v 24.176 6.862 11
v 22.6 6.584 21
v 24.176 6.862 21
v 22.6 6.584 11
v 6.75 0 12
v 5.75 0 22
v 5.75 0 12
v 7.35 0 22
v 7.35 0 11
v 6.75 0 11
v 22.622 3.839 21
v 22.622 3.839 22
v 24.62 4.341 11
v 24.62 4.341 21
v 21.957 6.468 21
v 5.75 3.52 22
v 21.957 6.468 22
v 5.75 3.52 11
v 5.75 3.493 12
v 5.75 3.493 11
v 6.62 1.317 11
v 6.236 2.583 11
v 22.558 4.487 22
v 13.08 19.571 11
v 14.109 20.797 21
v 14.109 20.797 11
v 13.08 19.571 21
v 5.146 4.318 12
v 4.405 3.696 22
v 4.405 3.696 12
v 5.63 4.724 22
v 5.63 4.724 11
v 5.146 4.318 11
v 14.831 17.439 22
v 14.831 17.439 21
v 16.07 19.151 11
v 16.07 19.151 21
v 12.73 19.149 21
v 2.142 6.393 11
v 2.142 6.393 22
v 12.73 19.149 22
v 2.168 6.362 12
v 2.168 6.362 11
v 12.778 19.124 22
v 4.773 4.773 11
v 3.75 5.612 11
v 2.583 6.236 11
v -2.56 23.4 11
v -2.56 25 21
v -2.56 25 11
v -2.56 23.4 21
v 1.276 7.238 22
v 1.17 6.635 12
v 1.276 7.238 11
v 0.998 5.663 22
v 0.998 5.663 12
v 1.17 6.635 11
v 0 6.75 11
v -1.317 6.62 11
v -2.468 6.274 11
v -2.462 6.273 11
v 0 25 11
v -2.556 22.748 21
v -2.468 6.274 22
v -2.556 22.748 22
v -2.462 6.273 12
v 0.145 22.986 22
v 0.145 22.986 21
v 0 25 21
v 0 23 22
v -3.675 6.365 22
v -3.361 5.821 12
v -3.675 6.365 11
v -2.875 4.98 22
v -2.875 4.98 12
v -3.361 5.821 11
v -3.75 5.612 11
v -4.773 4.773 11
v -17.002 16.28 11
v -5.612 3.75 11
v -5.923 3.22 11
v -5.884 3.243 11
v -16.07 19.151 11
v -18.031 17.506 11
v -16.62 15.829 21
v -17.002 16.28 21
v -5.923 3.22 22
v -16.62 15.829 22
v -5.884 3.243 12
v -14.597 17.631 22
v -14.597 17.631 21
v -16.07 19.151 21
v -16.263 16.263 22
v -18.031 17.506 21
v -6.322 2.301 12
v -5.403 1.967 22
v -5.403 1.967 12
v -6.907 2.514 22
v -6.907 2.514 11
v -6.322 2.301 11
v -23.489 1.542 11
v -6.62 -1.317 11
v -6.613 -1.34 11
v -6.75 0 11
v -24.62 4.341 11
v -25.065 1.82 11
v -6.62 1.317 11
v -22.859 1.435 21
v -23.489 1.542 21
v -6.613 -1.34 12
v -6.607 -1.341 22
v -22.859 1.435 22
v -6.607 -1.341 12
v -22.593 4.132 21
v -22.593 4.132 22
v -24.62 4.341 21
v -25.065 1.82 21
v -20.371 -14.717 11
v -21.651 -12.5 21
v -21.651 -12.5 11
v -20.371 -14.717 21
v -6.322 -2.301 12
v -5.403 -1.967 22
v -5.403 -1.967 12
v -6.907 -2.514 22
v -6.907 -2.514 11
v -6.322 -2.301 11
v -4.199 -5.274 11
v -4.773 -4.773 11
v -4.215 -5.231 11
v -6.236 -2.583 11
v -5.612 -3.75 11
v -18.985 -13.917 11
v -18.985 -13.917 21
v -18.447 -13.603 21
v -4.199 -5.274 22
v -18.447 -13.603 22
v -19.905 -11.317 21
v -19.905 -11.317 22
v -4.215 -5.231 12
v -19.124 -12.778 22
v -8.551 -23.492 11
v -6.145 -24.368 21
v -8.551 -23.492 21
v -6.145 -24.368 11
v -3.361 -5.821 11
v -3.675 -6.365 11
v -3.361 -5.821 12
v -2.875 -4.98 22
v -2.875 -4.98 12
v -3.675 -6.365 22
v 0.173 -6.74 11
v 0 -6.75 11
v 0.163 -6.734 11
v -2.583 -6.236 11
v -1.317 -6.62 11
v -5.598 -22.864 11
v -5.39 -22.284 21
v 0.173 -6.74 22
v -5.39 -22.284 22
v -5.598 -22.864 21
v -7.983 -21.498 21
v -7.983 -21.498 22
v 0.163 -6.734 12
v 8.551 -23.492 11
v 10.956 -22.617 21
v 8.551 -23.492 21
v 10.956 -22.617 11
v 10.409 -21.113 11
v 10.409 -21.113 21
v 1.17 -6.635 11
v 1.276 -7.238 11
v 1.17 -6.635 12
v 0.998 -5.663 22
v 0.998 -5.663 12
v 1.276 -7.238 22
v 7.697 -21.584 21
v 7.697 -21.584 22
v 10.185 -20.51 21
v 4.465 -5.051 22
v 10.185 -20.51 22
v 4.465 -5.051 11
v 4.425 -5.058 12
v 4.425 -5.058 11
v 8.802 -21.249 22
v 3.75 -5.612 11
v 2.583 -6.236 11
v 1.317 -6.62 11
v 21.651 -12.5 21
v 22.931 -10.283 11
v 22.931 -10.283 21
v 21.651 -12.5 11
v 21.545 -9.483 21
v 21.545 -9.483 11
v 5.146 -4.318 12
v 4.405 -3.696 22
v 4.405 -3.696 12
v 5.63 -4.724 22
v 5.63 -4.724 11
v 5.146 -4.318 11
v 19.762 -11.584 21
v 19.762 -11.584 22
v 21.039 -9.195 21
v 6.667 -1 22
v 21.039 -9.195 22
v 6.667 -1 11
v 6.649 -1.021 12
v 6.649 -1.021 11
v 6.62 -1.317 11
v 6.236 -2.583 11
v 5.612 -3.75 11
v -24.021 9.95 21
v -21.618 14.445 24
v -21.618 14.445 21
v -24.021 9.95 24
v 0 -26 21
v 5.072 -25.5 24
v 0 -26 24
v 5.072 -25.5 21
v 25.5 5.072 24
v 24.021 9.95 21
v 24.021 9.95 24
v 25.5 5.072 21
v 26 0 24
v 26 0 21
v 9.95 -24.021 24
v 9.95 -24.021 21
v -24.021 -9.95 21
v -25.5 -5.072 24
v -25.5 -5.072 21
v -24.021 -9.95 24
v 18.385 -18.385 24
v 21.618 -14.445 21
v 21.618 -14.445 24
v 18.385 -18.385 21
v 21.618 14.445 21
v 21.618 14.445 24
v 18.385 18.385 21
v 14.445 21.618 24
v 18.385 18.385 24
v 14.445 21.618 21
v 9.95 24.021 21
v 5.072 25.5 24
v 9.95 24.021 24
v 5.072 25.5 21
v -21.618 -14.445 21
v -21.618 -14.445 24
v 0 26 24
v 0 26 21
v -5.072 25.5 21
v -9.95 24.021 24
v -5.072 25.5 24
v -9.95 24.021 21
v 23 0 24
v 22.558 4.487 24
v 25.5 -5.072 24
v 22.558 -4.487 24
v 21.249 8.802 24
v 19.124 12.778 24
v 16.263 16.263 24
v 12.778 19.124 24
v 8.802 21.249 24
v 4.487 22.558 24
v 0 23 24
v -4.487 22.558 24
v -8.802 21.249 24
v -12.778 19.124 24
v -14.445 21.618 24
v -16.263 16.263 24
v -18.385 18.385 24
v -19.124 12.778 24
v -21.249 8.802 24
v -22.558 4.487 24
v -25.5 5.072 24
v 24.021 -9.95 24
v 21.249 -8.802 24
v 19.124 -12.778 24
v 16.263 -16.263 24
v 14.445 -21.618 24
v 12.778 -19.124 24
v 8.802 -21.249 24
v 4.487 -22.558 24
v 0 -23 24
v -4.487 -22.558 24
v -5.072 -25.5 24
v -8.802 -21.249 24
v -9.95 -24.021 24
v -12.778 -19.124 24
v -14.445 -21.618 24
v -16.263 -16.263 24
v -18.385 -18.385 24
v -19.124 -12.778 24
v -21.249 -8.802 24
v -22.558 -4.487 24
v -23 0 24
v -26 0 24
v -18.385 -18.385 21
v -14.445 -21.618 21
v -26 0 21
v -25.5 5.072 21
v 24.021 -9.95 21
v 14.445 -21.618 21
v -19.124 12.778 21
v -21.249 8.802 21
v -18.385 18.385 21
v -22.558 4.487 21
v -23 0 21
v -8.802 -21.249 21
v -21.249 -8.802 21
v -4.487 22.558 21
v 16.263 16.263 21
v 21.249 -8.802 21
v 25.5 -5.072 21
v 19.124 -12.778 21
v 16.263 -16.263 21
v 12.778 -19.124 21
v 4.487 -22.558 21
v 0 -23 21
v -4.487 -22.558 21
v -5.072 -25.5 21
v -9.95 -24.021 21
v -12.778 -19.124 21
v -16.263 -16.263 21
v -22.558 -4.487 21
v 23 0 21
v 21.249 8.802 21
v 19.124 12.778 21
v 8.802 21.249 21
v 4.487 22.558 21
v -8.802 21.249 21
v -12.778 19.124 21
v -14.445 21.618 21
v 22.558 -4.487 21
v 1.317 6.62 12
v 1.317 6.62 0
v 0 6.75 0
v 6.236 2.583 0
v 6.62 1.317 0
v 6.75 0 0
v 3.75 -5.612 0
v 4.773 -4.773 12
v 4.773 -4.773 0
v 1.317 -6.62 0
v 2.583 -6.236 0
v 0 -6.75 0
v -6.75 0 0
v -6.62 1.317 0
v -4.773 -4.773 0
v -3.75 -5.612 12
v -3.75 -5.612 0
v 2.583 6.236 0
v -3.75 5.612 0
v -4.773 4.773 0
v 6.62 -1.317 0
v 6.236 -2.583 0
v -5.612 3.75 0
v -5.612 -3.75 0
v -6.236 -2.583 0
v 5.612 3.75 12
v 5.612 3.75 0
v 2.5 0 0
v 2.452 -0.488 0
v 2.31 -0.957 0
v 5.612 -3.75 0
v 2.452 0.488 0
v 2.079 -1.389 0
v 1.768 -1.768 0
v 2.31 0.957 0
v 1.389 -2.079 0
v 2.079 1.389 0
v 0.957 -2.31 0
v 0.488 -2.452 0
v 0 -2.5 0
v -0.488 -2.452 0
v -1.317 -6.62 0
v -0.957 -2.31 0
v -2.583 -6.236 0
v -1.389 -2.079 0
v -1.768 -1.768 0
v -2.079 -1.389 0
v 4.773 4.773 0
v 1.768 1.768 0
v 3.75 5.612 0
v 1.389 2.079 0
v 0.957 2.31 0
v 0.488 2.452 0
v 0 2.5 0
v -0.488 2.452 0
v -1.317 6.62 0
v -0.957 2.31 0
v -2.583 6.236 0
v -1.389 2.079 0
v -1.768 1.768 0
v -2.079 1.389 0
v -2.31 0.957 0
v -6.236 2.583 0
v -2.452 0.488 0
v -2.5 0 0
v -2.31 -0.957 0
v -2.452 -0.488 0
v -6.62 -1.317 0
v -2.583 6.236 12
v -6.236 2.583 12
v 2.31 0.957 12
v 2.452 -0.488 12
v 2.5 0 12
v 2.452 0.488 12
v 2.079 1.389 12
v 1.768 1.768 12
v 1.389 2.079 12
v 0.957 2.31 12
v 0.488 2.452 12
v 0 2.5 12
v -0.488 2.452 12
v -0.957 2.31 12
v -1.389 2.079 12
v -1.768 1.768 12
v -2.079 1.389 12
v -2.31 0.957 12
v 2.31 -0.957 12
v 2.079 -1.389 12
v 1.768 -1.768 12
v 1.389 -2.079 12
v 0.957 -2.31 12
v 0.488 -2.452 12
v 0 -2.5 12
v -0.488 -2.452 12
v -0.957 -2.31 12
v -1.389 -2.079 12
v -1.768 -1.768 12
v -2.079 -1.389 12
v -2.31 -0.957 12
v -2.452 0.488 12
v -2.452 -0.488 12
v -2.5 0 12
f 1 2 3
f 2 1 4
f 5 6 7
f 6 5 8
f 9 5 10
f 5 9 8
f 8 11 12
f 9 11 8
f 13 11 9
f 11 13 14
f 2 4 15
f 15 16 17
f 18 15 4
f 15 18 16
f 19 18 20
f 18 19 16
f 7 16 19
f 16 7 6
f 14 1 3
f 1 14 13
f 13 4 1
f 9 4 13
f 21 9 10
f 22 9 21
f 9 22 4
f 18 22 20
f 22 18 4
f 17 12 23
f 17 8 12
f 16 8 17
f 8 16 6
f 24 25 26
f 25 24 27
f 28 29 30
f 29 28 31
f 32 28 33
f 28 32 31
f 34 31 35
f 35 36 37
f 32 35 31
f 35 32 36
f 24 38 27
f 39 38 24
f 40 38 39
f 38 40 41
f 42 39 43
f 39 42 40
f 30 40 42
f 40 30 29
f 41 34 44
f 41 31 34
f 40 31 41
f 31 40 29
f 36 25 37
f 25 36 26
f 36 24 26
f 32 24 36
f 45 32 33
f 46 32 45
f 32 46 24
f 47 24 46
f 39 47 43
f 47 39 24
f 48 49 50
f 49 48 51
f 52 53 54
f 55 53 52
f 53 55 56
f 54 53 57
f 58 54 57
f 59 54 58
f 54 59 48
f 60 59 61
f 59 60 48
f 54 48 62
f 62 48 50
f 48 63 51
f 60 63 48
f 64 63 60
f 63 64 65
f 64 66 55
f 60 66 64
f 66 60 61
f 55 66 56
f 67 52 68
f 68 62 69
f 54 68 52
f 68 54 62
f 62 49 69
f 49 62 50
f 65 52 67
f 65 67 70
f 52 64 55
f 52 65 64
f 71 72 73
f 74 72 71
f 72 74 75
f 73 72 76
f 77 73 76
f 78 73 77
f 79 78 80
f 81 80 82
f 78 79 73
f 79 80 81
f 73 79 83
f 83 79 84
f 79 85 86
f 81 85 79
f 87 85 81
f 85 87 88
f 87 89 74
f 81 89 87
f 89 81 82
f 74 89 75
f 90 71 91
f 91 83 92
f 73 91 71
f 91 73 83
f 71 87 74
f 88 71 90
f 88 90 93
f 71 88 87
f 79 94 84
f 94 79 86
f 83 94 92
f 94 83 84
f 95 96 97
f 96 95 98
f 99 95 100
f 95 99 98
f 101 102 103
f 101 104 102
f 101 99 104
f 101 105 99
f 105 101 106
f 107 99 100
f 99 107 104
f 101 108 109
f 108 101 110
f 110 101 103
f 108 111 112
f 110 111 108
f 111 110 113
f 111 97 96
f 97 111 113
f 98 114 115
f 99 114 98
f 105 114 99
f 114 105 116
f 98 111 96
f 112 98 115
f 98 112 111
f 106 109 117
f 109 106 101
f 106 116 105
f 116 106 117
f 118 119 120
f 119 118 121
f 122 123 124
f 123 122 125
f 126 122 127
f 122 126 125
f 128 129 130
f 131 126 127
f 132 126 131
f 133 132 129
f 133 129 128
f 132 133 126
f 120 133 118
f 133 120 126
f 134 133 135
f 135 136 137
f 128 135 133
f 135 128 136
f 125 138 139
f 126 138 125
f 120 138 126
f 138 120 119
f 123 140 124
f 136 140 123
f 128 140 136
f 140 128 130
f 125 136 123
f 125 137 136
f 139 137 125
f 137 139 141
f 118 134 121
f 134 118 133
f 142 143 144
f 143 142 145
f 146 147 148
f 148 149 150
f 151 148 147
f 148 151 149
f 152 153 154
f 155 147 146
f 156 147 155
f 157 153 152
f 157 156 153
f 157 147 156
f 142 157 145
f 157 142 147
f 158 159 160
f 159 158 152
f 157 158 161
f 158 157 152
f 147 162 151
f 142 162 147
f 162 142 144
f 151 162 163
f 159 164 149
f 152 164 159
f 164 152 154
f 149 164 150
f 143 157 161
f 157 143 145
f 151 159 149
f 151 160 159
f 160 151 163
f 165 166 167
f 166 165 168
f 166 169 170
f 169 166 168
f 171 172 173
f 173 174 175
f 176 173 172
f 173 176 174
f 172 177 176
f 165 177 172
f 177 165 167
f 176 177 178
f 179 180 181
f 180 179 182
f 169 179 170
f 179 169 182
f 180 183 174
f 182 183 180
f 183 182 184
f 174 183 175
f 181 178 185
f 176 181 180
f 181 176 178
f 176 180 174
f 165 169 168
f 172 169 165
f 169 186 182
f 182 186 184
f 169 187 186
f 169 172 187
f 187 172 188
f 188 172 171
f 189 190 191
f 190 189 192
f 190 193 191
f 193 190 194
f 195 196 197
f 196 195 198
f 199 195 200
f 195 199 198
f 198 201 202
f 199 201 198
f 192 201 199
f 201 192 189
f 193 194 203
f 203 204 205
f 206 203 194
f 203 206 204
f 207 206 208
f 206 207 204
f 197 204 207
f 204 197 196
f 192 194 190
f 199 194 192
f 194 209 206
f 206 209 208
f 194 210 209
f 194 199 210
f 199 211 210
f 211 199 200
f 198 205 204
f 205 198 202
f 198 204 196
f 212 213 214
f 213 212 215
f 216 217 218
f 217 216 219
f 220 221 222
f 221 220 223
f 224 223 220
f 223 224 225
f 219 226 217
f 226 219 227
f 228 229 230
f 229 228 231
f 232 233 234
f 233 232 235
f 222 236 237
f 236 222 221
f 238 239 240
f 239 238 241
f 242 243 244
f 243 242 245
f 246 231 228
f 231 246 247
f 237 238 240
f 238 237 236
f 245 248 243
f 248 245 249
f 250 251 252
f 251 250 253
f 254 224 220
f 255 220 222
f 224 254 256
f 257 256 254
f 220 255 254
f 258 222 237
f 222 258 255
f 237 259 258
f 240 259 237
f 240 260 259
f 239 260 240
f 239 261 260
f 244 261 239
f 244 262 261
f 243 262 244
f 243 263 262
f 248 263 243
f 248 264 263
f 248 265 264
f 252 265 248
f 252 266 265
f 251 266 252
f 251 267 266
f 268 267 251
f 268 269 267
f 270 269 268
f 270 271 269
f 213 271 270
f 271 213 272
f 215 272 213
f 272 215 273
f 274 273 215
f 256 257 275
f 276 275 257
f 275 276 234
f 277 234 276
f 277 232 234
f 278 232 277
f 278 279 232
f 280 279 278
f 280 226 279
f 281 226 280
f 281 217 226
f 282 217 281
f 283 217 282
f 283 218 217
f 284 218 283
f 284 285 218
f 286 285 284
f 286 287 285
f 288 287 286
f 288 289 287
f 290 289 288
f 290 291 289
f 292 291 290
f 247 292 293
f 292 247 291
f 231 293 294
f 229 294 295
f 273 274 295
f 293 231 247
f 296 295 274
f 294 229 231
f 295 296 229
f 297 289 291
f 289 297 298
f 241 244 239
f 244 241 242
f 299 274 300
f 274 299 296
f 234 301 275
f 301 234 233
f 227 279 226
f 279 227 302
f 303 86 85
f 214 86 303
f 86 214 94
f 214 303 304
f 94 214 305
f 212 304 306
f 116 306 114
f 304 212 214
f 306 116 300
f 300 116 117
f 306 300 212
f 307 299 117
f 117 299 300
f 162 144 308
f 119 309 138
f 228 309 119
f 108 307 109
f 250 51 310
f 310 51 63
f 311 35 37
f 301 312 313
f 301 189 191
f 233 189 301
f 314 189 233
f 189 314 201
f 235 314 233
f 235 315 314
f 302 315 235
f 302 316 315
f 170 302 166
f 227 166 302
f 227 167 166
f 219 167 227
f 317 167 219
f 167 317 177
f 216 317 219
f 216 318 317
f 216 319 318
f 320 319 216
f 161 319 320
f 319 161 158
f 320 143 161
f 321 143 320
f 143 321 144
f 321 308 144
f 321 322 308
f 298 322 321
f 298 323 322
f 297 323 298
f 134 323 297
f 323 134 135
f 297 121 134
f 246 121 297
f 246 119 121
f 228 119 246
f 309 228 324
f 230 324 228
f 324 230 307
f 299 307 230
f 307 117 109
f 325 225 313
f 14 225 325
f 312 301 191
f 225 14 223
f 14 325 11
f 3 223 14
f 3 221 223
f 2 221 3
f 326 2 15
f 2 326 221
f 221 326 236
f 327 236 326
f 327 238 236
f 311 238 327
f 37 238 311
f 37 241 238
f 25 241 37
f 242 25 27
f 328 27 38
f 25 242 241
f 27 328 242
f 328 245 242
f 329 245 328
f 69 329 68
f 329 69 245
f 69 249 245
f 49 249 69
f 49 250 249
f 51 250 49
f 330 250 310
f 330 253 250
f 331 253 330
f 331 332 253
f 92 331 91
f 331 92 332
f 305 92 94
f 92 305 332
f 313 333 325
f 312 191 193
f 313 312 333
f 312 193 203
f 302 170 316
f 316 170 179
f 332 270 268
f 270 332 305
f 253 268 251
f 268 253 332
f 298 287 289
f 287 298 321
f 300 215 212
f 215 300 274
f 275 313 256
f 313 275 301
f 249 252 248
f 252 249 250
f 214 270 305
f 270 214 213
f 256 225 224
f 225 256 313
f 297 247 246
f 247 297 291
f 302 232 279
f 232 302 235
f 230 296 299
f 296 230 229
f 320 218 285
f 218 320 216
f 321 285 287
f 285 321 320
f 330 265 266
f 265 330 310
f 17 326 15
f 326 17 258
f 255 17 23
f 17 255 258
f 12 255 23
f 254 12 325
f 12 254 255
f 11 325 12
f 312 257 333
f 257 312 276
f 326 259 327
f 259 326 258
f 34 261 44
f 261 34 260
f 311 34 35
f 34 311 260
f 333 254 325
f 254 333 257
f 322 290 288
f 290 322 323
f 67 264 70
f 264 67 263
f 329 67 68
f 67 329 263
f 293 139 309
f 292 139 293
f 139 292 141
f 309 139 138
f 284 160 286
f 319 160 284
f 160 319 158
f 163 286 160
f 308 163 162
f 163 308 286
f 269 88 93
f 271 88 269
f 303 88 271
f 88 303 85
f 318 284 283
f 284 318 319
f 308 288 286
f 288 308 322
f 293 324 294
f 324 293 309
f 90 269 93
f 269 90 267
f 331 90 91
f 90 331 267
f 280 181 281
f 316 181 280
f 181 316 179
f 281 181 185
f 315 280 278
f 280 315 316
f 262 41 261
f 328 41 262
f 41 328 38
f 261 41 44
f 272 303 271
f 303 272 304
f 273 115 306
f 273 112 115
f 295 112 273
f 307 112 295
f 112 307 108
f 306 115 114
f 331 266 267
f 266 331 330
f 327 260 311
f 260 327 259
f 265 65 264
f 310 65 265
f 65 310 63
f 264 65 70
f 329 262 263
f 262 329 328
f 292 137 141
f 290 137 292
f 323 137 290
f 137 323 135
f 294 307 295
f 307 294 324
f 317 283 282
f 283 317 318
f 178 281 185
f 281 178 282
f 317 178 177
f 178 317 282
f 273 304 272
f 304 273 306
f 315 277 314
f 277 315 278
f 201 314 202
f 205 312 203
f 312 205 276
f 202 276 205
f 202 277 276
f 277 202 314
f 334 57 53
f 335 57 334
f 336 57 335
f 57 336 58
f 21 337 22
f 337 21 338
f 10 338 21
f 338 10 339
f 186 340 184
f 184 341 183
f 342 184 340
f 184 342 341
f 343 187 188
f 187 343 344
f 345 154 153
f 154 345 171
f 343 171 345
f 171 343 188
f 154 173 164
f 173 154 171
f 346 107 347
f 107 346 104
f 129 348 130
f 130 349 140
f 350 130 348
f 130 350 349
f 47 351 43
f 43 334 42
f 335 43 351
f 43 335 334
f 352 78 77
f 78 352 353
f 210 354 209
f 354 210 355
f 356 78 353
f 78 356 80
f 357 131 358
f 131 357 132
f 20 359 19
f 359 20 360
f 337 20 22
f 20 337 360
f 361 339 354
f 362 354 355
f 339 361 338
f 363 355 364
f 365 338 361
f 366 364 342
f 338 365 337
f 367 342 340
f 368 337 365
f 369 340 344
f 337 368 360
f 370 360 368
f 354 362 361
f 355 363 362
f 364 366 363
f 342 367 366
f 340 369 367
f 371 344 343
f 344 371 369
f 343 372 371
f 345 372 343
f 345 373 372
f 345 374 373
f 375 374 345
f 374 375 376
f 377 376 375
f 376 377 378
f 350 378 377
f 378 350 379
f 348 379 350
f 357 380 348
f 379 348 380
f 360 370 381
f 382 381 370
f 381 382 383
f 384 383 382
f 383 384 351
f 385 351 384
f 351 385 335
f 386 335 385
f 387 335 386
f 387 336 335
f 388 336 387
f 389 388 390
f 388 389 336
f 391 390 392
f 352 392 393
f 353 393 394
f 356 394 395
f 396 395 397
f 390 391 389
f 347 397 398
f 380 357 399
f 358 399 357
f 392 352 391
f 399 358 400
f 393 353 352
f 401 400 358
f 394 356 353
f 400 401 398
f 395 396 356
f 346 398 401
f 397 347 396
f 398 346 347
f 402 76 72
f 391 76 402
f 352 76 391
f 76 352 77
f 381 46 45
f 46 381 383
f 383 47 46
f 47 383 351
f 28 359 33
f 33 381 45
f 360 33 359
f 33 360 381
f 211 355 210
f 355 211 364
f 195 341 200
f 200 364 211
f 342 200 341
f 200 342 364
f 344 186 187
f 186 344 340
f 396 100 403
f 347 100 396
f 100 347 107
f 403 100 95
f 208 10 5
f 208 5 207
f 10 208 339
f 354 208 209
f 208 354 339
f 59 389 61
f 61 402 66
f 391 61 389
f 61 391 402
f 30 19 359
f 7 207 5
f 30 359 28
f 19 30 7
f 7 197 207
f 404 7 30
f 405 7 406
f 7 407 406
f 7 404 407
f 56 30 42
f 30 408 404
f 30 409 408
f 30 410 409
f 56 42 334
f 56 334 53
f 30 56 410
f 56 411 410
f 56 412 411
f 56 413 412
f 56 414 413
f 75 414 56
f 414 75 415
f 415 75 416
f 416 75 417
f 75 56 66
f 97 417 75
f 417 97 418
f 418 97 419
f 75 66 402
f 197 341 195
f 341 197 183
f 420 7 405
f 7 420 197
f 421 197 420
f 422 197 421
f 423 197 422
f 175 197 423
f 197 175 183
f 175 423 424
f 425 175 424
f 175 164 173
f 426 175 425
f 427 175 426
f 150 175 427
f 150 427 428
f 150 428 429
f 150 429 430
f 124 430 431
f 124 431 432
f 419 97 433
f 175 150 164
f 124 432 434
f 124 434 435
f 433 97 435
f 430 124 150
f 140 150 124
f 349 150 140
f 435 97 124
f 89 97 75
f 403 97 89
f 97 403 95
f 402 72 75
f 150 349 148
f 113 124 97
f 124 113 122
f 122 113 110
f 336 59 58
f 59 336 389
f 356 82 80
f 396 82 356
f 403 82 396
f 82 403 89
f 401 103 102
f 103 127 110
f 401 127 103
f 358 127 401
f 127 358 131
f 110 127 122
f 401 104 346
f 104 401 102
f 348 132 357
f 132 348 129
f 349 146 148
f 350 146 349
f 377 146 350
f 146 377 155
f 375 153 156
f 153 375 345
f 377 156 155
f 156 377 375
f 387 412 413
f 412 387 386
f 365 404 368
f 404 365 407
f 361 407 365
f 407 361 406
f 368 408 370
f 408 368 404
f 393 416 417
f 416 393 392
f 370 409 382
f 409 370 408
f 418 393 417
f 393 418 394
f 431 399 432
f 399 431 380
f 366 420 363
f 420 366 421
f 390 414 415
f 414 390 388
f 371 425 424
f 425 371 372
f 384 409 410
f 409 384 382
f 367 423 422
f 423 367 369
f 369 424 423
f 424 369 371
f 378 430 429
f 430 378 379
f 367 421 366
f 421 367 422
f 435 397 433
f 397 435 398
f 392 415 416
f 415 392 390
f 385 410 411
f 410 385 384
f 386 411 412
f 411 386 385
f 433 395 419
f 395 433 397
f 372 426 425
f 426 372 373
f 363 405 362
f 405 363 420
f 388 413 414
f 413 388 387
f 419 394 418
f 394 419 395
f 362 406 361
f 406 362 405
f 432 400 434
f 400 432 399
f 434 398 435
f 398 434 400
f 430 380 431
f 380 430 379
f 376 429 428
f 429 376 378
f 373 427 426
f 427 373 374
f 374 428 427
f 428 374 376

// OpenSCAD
$fn = 32;

// ----------------------------------------------------------------------
// Impeller: 50 mm, 9 blades, 24 mm tall
// ----------------------------------------------------------------------

// --- parameters (mm) ---
hub_d = 13.5;             // hub diameter
hub_h = 12;               // hub height
imp_d = 50;               // outer diameter over the blades
blades = 9;               // number of blades
blade_t = 1.6;            // blade thickness
blade_h = 10;             // blade height
blade_in_r = 5.75;        // blade root radius
blade_out_r = 23.4;       // blade tip radius
sweep = 10;               // blade sweep, degrees
bore_d = 5;               // shaft bore
shroud_h = 2;             // shroud ring thickness
shroud_d = 52;            // shroud outside diameter

module hub() {
  cylinder(h = hub_h, d = hub_d);
}

module blade() {
  /* blade swept between two boxes: hull of the root and the tip section */
  hull() {
    translate([blade_in_r, 0, hub_h - 1])
      cube([blade_t, blade_t * 2.2, blade_h + 1], center = false);
    rotate([0, 0, sweep])
      translate([blade_out_r, 0, hub_h - 1])
        cube([blade_t, blade_t * 1.6, blade_h + 1], center = false);
  }
}

module blades() {
  for (i = [0 : blades - 1])
    rotate([0, 0, i * 360 / blades]) blade();
}

module shroud() {
  translate([0, 0, hub_h + blade_h - 1])
    difference() {
      cylinder(h = shroud_h + 1, d = shroud_d);
      translate([0, 0, -1]) cylinder(h = shroud_h + 3, d = shroud_d - 2 * 3);
    }
}

difference() {
  union() {
    hub();
    blades();
    shroud();
  }
  translate([0, 0, -1]) cylinder(h = hub_h + blade_h + shroud_h + 3, d = bore_d);
}
